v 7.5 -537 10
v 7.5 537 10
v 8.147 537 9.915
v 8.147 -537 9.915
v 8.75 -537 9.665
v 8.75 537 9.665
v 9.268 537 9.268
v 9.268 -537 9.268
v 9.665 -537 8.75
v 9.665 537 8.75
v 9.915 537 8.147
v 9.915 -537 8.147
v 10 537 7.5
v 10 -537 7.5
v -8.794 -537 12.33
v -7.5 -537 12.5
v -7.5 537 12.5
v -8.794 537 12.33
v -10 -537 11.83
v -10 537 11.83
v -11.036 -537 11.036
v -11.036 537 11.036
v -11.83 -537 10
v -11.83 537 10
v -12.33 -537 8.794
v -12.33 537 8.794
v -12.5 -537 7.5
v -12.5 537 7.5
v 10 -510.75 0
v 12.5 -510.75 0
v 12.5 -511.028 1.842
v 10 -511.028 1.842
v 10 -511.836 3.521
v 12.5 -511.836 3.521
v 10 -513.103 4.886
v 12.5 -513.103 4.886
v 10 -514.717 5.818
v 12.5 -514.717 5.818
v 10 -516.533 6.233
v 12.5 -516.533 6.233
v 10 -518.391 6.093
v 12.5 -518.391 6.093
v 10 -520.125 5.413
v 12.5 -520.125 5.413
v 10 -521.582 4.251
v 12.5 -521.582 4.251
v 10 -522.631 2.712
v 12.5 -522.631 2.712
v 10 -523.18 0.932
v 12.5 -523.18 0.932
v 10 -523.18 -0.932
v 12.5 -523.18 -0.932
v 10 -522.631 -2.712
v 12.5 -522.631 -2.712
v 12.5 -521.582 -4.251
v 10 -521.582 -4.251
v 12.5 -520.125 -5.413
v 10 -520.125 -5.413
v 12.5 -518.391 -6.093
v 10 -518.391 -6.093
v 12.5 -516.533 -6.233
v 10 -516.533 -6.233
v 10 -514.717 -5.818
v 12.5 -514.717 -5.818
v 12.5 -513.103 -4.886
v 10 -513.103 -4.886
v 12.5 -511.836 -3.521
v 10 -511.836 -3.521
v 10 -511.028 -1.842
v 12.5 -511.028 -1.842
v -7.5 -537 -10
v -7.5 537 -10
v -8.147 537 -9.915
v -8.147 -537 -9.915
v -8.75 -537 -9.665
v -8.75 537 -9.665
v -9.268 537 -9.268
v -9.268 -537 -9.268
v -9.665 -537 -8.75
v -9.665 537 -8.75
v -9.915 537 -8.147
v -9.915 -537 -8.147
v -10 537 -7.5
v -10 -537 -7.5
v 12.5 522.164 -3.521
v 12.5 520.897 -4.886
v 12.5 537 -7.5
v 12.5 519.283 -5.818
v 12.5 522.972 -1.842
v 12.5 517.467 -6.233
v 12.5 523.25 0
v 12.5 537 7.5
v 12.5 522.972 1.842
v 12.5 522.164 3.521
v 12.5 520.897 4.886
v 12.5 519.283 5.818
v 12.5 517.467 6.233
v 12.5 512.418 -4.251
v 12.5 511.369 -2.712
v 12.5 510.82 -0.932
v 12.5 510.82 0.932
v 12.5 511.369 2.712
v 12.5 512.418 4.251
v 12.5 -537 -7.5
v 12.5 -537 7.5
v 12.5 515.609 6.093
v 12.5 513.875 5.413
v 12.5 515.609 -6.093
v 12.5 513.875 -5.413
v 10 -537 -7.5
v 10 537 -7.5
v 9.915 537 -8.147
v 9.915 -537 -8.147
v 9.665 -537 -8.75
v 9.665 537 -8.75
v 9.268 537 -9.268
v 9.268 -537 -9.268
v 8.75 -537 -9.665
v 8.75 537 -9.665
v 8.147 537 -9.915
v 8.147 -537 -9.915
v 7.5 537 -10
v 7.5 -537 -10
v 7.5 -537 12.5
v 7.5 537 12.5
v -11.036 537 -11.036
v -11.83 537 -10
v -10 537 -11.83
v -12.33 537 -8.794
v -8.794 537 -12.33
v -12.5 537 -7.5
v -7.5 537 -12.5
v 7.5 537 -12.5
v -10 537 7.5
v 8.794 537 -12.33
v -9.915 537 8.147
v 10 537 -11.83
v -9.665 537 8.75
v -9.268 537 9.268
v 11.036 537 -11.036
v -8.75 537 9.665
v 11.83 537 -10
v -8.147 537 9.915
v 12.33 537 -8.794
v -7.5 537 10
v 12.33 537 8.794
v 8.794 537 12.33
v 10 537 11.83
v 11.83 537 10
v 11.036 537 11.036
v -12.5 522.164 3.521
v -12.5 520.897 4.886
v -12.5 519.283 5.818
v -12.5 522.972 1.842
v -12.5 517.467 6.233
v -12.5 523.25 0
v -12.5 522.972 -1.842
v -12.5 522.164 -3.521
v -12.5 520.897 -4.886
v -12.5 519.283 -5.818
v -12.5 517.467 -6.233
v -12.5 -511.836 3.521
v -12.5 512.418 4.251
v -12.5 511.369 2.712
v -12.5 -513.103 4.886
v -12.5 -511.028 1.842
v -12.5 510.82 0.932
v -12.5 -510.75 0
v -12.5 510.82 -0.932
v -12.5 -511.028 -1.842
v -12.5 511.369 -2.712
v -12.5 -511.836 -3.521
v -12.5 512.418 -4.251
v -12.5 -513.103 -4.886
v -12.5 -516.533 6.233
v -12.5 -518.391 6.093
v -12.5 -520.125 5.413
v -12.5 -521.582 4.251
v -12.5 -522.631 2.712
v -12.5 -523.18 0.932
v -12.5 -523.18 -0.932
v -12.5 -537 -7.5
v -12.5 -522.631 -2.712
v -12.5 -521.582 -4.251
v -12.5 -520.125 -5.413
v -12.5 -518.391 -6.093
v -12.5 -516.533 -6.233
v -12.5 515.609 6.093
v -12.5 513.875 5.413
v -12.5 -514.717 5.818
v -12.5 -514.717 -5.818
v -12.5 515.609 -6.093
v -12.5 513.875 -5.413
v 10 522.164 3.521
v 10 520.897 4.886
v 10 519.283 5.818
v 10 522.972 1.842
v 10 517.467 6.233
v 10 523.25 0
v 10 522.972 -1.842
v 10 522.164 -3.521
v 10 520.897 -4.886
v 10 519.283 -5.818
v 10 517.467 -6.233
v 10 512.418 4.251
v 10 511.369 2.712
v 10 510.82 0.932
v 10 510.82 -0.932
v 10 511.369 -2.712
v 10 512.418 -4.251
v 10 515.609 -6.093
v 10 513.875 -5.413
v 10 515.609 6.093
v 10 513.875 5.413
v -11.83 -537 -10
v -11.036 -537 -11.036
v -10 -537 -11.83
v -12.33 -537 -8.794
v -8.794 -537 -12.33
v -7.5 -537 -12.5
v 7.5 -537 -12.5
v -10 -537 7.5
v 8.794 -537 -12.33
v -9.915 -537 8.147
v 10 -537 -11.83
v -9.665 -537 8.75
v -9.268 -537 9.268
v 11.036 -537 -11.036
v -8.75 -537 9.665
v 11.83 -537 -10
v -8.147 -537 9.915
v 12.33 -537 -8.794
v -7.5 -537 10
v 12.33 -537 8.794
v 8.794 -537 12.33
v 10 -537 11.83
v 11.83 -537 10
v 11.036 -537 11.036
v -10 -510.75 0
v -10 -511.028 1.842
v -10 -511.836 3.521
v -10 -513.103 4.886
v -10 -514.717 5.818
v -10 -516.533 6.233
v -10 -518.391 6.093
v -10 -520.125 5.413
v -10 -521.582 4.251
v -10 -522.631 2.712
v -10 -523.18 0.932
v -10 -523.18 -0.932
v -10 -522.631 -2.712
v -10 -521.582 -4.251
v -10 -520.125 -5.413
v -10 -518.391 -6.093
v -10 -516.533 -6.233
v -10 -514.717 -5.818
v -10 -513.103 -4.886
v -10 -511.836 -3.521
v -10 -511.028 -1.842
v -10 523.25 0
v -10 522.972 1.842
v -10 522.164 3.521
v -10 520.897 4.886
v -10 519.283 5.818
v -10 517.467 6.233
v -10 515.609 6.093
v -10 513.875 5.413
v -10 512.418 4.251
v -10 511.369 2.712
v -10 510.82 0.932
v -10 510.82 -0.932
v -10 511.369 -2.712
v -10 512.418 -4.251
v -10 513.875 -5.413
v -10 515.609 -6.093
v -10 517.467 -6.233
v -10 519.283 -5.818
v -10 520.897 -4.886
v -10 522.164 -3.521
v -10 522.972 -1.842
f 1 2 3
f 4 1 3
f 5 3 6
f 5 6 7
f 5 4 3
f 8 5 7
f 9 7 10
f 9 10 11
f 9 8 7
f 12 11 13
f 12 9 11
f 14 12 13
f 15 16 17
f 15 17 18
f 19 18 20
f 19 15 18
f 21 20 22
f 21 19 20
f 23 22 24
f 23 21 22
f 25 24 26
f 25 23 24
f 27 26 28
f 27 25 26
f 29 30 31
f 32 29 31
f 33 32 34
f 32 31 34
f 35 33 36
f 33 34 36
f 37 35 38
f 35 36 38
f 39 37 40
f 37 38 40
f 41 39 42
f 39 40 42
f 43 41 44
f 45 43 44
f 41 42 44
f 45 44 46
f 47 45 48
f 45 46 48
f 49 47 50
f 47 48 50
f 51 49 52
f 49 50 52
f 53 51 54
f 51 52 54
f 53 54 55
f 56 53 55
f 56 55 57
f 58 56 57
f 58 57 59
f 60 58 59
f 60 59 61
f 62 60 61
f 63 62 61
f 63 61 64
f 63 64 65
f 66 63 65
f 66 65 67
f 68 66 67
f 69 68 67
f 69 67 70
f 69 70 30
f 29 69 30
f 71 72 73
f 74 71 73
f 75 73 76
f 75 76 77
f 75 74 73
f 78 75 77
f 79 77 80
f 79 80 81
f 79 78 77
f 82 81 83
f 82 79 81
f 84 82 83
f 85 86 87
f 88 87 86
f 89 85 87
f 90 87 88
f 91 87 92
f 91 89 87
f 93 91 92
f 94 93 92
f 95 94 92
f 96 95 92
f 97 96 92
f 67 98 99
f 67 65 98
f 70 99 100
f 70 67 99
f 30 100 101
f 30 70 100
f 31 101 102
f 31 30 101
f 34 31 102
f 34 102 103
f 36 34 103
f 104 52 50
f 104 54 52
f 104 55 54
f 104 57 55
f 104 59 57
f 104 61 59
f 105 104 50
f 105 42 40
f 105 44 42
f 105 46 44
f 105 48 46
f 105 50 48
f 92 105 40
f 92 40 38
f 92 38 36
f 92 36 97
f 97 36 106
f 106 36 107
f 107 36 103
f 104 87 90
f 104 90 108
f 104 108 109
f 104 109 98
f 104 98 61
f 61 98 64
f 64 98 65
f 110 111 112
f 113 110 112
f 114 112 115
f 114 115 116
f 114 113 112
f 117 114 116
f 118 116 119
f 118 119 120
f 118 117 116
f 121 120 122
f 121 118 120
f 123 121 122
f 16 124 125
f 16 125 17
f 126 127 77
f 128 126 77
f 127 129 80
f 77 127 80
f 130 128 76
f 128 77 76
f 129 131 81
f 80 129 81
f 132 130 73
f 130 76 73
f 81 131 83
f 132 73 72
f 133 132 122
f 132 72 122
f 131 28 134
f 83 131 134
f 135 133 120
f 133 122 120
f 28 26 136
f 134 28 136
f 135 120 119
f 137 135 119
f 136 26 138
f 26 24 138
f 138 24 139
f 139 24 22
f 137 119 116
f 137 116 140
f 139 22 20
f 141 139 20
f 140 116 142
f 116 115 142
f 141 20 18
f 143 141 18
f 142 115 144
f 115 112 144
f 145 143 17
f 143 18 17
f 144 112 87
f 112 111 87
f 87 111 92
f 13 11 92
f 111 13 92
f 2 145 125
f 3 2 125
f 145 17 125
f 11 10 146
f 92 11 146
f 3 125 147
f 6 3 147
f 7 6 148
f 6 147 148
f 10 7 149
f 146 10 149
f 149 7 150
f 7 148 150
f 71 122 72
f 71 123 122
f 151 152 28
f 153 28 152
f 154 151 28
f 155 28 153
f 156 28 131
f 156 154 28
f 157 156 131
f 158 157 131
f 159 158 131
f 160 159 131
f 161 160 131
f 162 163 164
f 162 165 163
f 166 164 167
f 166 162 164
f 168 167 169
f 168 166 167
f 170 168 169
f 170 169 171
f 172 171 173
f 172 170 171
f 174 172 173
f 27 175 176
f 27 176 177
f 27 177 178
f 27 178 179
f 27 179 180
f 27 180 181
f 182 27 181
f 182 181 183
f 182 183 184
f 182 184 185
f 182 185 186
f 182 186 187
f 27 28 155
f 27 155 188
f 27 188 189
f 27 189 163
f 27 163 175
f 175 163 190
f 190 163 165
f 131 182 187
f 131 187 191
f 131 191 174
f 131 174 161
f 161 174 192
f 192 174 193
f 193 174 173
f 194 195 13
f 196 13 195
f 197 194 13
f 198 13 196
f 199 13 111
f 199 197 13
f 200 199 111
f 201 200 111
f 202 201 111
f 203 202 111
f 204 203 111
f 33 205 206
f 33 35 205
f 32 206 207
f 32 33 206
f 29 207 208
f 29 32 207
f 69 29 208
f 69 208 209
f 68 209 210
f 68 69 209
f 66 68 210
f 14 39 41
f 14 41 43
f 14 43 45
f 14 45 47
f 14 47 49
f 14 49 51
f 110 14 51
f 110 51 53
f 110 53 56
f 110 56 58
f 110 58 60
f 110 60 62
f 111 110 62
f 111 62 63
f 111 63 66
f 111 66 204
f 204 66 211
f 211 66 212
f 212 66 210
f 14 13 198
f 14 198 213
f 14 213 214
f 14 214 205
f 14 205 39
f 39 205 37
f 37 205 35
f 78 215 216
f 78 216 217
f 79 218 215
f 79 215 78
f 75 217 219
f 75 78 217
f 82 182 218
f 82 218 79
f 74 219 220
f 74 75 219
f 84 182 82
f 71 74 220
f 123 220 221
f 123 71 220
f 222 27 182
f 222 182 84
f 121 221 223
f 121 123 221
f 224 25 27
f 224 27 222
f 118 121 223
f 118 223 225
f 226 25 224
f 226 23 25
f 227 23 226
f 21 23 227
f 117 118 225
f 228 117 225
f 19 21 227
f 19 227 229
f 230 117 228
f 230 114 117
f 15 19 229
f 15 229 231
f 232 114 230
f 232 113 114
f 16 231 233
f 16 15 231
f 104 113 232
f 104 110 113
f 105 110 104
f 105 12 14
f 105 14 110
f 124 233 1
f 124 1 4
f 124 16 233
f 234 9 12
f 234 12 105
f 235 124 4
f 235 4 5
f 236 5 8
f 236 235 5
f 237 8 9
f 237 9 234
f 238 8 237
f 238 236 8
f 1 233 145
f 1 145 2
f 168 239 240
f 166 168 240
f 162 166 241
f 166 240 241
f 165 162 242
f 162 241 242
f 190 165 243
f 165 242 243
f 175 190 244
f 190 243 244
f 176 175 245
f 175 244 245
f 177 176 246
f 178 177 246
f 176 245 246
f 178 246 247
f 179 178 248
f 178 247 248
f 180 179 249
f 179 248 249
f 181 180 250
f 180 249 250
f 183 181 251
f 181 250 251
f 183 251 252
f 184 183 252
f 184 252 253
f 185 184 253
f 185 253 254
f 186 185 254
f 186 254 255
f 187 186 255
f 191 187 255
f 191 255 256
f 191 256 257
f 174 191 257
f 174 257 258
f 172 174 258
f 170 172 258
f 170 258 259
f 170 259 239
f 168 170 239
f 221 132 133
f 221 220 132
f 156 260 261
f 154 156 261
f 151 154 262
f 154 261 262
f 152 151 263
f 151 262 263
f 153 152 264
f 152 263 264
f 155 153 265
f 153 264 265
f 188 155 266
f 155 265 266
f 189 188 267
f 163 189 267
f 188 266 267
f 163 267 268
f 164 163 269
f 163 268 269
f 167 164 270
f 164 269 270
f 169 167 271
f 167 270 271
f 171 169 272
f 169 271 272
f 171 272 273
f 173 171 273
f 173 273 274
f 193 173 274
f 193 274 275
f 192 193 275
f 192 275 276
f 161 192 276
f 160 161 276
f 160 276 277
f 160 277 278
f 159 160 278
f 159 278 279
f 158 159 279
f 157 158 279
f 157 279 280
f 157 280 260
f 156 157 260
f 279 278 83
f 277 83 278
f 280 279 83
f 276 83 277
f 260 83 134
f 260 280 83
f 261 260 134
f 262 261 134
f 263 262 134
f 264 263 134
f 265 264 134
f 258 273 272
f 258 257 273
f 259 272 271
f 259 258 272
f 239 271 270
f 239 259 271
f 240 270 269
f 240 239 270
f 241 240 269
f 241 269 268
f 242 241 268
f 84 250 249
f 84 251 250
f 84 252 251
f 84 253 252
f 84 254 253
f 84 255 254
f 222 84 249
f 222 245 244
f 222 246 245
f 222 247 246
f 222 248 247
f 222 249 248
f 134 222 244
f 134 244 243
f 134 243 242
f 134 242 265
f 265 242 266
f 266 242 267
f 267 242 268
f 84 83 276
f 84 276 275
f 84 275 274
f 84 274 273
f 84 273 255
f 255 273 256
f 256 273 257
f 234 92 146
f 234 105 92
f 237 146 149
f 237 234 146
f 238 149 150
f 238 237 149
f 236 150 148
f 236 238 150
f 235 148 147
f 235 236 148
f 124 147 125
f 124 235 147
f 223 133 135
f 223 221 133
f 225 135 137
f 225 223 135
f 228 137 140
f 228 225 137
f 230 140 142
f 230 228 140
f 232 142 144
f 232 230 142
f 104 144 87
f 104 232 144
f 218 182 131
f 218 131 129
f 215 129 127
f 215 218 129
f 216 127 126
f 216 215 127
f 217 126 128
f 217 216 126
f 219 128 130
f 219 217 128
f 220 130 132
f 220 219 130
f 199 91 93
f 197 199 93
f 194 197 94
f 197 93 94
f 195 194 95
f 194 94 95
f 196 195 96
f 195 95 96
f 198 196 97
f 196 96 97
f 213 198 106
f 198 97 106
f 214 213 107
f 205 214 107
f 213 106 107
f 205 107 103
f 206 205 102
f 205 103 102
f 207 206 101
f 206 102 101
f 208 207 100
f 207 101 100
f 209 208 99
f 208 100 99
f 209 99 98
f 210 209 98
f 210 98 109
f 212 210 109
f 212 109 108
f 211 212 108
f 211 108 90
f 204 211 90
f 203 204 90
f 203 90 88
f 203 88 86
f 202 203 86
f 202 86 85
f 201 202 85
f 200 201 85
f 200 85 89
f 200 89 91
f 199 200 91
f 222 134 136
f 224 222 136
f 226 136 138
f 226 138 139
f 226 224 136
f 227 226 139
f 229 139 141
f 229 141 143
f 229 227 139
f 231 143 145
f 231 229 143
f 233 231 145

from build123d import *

# Parameters (mm, degrees)
F1_DEPTH = 537
F2_R     = 6.25
F3_DEPTH = 25.001


with BuildPart() as f1:
    # F0 (on Front) → F1 (new body, symmetric)
    with BuildSketch(Plane.XZ):
        with BuildLine():
            ThreePointArc((12.5, 7.5), (11.035534, 11.035534), (7.5, 12.5))
            Line((7.5, 12.5), (-7.5, 12.5))
            ThreePointArc((-7.5, 12.5), (-11.035534, 11.035534), (-12.5, 7.5))
            Line((-12.5, 7.5), (-12.5, -7.5))
            ThreePointArc((-12.5, -7.5), (-11.035534, -11.035534), (-7.5, -12.5))
            Line((-7.5, -12.5), (7.5, -12.5))
            ThreePointArc((7.5, -12.5), (11.035534, -11.035534), (12.5, -7.5))
            Line((12.5, -7.5), (12.5, 7.5))
        make_face()
        with BuildLine():
            Line((-7.5, 10), (7.5, 10))
            ThreePointArc((7.5, 10), (9.267767, 9.267767), (10, 7.5))
            Line((10, 7.5), (10, -7.5))
            ThreePointArc((10, -7.5), (9.267767, -9.267767), (7.5, -10))
            Line((7.5, -10), (-7.5, -10))
            ThreePointArc((-7.5, -10), (-9.267767, -9.267767), (-10, -7.5))
            Line((-10, -7.5), (-10, 7.5))
            ThreePointArc((-10, 7.5), (-9.267767, 9.267767), (-7.5, 10))
        make_face(mode=Mode.SUBTRACT)
    extrude(amount=F1_DEPTH, both=True)

    # F2 (on face) → F3 (cut, through all)
    with BuildSketch(Plane.YZ.offset(12.5)):
        with Locations((-517, 0)):
            Circle(F2_R)
        with Locations((517, 0)):
            Circle(F2_R)
    extrude(amount=-F3_DEPTH, mode=Mode.SUBTRACT)


solid = f1.part
